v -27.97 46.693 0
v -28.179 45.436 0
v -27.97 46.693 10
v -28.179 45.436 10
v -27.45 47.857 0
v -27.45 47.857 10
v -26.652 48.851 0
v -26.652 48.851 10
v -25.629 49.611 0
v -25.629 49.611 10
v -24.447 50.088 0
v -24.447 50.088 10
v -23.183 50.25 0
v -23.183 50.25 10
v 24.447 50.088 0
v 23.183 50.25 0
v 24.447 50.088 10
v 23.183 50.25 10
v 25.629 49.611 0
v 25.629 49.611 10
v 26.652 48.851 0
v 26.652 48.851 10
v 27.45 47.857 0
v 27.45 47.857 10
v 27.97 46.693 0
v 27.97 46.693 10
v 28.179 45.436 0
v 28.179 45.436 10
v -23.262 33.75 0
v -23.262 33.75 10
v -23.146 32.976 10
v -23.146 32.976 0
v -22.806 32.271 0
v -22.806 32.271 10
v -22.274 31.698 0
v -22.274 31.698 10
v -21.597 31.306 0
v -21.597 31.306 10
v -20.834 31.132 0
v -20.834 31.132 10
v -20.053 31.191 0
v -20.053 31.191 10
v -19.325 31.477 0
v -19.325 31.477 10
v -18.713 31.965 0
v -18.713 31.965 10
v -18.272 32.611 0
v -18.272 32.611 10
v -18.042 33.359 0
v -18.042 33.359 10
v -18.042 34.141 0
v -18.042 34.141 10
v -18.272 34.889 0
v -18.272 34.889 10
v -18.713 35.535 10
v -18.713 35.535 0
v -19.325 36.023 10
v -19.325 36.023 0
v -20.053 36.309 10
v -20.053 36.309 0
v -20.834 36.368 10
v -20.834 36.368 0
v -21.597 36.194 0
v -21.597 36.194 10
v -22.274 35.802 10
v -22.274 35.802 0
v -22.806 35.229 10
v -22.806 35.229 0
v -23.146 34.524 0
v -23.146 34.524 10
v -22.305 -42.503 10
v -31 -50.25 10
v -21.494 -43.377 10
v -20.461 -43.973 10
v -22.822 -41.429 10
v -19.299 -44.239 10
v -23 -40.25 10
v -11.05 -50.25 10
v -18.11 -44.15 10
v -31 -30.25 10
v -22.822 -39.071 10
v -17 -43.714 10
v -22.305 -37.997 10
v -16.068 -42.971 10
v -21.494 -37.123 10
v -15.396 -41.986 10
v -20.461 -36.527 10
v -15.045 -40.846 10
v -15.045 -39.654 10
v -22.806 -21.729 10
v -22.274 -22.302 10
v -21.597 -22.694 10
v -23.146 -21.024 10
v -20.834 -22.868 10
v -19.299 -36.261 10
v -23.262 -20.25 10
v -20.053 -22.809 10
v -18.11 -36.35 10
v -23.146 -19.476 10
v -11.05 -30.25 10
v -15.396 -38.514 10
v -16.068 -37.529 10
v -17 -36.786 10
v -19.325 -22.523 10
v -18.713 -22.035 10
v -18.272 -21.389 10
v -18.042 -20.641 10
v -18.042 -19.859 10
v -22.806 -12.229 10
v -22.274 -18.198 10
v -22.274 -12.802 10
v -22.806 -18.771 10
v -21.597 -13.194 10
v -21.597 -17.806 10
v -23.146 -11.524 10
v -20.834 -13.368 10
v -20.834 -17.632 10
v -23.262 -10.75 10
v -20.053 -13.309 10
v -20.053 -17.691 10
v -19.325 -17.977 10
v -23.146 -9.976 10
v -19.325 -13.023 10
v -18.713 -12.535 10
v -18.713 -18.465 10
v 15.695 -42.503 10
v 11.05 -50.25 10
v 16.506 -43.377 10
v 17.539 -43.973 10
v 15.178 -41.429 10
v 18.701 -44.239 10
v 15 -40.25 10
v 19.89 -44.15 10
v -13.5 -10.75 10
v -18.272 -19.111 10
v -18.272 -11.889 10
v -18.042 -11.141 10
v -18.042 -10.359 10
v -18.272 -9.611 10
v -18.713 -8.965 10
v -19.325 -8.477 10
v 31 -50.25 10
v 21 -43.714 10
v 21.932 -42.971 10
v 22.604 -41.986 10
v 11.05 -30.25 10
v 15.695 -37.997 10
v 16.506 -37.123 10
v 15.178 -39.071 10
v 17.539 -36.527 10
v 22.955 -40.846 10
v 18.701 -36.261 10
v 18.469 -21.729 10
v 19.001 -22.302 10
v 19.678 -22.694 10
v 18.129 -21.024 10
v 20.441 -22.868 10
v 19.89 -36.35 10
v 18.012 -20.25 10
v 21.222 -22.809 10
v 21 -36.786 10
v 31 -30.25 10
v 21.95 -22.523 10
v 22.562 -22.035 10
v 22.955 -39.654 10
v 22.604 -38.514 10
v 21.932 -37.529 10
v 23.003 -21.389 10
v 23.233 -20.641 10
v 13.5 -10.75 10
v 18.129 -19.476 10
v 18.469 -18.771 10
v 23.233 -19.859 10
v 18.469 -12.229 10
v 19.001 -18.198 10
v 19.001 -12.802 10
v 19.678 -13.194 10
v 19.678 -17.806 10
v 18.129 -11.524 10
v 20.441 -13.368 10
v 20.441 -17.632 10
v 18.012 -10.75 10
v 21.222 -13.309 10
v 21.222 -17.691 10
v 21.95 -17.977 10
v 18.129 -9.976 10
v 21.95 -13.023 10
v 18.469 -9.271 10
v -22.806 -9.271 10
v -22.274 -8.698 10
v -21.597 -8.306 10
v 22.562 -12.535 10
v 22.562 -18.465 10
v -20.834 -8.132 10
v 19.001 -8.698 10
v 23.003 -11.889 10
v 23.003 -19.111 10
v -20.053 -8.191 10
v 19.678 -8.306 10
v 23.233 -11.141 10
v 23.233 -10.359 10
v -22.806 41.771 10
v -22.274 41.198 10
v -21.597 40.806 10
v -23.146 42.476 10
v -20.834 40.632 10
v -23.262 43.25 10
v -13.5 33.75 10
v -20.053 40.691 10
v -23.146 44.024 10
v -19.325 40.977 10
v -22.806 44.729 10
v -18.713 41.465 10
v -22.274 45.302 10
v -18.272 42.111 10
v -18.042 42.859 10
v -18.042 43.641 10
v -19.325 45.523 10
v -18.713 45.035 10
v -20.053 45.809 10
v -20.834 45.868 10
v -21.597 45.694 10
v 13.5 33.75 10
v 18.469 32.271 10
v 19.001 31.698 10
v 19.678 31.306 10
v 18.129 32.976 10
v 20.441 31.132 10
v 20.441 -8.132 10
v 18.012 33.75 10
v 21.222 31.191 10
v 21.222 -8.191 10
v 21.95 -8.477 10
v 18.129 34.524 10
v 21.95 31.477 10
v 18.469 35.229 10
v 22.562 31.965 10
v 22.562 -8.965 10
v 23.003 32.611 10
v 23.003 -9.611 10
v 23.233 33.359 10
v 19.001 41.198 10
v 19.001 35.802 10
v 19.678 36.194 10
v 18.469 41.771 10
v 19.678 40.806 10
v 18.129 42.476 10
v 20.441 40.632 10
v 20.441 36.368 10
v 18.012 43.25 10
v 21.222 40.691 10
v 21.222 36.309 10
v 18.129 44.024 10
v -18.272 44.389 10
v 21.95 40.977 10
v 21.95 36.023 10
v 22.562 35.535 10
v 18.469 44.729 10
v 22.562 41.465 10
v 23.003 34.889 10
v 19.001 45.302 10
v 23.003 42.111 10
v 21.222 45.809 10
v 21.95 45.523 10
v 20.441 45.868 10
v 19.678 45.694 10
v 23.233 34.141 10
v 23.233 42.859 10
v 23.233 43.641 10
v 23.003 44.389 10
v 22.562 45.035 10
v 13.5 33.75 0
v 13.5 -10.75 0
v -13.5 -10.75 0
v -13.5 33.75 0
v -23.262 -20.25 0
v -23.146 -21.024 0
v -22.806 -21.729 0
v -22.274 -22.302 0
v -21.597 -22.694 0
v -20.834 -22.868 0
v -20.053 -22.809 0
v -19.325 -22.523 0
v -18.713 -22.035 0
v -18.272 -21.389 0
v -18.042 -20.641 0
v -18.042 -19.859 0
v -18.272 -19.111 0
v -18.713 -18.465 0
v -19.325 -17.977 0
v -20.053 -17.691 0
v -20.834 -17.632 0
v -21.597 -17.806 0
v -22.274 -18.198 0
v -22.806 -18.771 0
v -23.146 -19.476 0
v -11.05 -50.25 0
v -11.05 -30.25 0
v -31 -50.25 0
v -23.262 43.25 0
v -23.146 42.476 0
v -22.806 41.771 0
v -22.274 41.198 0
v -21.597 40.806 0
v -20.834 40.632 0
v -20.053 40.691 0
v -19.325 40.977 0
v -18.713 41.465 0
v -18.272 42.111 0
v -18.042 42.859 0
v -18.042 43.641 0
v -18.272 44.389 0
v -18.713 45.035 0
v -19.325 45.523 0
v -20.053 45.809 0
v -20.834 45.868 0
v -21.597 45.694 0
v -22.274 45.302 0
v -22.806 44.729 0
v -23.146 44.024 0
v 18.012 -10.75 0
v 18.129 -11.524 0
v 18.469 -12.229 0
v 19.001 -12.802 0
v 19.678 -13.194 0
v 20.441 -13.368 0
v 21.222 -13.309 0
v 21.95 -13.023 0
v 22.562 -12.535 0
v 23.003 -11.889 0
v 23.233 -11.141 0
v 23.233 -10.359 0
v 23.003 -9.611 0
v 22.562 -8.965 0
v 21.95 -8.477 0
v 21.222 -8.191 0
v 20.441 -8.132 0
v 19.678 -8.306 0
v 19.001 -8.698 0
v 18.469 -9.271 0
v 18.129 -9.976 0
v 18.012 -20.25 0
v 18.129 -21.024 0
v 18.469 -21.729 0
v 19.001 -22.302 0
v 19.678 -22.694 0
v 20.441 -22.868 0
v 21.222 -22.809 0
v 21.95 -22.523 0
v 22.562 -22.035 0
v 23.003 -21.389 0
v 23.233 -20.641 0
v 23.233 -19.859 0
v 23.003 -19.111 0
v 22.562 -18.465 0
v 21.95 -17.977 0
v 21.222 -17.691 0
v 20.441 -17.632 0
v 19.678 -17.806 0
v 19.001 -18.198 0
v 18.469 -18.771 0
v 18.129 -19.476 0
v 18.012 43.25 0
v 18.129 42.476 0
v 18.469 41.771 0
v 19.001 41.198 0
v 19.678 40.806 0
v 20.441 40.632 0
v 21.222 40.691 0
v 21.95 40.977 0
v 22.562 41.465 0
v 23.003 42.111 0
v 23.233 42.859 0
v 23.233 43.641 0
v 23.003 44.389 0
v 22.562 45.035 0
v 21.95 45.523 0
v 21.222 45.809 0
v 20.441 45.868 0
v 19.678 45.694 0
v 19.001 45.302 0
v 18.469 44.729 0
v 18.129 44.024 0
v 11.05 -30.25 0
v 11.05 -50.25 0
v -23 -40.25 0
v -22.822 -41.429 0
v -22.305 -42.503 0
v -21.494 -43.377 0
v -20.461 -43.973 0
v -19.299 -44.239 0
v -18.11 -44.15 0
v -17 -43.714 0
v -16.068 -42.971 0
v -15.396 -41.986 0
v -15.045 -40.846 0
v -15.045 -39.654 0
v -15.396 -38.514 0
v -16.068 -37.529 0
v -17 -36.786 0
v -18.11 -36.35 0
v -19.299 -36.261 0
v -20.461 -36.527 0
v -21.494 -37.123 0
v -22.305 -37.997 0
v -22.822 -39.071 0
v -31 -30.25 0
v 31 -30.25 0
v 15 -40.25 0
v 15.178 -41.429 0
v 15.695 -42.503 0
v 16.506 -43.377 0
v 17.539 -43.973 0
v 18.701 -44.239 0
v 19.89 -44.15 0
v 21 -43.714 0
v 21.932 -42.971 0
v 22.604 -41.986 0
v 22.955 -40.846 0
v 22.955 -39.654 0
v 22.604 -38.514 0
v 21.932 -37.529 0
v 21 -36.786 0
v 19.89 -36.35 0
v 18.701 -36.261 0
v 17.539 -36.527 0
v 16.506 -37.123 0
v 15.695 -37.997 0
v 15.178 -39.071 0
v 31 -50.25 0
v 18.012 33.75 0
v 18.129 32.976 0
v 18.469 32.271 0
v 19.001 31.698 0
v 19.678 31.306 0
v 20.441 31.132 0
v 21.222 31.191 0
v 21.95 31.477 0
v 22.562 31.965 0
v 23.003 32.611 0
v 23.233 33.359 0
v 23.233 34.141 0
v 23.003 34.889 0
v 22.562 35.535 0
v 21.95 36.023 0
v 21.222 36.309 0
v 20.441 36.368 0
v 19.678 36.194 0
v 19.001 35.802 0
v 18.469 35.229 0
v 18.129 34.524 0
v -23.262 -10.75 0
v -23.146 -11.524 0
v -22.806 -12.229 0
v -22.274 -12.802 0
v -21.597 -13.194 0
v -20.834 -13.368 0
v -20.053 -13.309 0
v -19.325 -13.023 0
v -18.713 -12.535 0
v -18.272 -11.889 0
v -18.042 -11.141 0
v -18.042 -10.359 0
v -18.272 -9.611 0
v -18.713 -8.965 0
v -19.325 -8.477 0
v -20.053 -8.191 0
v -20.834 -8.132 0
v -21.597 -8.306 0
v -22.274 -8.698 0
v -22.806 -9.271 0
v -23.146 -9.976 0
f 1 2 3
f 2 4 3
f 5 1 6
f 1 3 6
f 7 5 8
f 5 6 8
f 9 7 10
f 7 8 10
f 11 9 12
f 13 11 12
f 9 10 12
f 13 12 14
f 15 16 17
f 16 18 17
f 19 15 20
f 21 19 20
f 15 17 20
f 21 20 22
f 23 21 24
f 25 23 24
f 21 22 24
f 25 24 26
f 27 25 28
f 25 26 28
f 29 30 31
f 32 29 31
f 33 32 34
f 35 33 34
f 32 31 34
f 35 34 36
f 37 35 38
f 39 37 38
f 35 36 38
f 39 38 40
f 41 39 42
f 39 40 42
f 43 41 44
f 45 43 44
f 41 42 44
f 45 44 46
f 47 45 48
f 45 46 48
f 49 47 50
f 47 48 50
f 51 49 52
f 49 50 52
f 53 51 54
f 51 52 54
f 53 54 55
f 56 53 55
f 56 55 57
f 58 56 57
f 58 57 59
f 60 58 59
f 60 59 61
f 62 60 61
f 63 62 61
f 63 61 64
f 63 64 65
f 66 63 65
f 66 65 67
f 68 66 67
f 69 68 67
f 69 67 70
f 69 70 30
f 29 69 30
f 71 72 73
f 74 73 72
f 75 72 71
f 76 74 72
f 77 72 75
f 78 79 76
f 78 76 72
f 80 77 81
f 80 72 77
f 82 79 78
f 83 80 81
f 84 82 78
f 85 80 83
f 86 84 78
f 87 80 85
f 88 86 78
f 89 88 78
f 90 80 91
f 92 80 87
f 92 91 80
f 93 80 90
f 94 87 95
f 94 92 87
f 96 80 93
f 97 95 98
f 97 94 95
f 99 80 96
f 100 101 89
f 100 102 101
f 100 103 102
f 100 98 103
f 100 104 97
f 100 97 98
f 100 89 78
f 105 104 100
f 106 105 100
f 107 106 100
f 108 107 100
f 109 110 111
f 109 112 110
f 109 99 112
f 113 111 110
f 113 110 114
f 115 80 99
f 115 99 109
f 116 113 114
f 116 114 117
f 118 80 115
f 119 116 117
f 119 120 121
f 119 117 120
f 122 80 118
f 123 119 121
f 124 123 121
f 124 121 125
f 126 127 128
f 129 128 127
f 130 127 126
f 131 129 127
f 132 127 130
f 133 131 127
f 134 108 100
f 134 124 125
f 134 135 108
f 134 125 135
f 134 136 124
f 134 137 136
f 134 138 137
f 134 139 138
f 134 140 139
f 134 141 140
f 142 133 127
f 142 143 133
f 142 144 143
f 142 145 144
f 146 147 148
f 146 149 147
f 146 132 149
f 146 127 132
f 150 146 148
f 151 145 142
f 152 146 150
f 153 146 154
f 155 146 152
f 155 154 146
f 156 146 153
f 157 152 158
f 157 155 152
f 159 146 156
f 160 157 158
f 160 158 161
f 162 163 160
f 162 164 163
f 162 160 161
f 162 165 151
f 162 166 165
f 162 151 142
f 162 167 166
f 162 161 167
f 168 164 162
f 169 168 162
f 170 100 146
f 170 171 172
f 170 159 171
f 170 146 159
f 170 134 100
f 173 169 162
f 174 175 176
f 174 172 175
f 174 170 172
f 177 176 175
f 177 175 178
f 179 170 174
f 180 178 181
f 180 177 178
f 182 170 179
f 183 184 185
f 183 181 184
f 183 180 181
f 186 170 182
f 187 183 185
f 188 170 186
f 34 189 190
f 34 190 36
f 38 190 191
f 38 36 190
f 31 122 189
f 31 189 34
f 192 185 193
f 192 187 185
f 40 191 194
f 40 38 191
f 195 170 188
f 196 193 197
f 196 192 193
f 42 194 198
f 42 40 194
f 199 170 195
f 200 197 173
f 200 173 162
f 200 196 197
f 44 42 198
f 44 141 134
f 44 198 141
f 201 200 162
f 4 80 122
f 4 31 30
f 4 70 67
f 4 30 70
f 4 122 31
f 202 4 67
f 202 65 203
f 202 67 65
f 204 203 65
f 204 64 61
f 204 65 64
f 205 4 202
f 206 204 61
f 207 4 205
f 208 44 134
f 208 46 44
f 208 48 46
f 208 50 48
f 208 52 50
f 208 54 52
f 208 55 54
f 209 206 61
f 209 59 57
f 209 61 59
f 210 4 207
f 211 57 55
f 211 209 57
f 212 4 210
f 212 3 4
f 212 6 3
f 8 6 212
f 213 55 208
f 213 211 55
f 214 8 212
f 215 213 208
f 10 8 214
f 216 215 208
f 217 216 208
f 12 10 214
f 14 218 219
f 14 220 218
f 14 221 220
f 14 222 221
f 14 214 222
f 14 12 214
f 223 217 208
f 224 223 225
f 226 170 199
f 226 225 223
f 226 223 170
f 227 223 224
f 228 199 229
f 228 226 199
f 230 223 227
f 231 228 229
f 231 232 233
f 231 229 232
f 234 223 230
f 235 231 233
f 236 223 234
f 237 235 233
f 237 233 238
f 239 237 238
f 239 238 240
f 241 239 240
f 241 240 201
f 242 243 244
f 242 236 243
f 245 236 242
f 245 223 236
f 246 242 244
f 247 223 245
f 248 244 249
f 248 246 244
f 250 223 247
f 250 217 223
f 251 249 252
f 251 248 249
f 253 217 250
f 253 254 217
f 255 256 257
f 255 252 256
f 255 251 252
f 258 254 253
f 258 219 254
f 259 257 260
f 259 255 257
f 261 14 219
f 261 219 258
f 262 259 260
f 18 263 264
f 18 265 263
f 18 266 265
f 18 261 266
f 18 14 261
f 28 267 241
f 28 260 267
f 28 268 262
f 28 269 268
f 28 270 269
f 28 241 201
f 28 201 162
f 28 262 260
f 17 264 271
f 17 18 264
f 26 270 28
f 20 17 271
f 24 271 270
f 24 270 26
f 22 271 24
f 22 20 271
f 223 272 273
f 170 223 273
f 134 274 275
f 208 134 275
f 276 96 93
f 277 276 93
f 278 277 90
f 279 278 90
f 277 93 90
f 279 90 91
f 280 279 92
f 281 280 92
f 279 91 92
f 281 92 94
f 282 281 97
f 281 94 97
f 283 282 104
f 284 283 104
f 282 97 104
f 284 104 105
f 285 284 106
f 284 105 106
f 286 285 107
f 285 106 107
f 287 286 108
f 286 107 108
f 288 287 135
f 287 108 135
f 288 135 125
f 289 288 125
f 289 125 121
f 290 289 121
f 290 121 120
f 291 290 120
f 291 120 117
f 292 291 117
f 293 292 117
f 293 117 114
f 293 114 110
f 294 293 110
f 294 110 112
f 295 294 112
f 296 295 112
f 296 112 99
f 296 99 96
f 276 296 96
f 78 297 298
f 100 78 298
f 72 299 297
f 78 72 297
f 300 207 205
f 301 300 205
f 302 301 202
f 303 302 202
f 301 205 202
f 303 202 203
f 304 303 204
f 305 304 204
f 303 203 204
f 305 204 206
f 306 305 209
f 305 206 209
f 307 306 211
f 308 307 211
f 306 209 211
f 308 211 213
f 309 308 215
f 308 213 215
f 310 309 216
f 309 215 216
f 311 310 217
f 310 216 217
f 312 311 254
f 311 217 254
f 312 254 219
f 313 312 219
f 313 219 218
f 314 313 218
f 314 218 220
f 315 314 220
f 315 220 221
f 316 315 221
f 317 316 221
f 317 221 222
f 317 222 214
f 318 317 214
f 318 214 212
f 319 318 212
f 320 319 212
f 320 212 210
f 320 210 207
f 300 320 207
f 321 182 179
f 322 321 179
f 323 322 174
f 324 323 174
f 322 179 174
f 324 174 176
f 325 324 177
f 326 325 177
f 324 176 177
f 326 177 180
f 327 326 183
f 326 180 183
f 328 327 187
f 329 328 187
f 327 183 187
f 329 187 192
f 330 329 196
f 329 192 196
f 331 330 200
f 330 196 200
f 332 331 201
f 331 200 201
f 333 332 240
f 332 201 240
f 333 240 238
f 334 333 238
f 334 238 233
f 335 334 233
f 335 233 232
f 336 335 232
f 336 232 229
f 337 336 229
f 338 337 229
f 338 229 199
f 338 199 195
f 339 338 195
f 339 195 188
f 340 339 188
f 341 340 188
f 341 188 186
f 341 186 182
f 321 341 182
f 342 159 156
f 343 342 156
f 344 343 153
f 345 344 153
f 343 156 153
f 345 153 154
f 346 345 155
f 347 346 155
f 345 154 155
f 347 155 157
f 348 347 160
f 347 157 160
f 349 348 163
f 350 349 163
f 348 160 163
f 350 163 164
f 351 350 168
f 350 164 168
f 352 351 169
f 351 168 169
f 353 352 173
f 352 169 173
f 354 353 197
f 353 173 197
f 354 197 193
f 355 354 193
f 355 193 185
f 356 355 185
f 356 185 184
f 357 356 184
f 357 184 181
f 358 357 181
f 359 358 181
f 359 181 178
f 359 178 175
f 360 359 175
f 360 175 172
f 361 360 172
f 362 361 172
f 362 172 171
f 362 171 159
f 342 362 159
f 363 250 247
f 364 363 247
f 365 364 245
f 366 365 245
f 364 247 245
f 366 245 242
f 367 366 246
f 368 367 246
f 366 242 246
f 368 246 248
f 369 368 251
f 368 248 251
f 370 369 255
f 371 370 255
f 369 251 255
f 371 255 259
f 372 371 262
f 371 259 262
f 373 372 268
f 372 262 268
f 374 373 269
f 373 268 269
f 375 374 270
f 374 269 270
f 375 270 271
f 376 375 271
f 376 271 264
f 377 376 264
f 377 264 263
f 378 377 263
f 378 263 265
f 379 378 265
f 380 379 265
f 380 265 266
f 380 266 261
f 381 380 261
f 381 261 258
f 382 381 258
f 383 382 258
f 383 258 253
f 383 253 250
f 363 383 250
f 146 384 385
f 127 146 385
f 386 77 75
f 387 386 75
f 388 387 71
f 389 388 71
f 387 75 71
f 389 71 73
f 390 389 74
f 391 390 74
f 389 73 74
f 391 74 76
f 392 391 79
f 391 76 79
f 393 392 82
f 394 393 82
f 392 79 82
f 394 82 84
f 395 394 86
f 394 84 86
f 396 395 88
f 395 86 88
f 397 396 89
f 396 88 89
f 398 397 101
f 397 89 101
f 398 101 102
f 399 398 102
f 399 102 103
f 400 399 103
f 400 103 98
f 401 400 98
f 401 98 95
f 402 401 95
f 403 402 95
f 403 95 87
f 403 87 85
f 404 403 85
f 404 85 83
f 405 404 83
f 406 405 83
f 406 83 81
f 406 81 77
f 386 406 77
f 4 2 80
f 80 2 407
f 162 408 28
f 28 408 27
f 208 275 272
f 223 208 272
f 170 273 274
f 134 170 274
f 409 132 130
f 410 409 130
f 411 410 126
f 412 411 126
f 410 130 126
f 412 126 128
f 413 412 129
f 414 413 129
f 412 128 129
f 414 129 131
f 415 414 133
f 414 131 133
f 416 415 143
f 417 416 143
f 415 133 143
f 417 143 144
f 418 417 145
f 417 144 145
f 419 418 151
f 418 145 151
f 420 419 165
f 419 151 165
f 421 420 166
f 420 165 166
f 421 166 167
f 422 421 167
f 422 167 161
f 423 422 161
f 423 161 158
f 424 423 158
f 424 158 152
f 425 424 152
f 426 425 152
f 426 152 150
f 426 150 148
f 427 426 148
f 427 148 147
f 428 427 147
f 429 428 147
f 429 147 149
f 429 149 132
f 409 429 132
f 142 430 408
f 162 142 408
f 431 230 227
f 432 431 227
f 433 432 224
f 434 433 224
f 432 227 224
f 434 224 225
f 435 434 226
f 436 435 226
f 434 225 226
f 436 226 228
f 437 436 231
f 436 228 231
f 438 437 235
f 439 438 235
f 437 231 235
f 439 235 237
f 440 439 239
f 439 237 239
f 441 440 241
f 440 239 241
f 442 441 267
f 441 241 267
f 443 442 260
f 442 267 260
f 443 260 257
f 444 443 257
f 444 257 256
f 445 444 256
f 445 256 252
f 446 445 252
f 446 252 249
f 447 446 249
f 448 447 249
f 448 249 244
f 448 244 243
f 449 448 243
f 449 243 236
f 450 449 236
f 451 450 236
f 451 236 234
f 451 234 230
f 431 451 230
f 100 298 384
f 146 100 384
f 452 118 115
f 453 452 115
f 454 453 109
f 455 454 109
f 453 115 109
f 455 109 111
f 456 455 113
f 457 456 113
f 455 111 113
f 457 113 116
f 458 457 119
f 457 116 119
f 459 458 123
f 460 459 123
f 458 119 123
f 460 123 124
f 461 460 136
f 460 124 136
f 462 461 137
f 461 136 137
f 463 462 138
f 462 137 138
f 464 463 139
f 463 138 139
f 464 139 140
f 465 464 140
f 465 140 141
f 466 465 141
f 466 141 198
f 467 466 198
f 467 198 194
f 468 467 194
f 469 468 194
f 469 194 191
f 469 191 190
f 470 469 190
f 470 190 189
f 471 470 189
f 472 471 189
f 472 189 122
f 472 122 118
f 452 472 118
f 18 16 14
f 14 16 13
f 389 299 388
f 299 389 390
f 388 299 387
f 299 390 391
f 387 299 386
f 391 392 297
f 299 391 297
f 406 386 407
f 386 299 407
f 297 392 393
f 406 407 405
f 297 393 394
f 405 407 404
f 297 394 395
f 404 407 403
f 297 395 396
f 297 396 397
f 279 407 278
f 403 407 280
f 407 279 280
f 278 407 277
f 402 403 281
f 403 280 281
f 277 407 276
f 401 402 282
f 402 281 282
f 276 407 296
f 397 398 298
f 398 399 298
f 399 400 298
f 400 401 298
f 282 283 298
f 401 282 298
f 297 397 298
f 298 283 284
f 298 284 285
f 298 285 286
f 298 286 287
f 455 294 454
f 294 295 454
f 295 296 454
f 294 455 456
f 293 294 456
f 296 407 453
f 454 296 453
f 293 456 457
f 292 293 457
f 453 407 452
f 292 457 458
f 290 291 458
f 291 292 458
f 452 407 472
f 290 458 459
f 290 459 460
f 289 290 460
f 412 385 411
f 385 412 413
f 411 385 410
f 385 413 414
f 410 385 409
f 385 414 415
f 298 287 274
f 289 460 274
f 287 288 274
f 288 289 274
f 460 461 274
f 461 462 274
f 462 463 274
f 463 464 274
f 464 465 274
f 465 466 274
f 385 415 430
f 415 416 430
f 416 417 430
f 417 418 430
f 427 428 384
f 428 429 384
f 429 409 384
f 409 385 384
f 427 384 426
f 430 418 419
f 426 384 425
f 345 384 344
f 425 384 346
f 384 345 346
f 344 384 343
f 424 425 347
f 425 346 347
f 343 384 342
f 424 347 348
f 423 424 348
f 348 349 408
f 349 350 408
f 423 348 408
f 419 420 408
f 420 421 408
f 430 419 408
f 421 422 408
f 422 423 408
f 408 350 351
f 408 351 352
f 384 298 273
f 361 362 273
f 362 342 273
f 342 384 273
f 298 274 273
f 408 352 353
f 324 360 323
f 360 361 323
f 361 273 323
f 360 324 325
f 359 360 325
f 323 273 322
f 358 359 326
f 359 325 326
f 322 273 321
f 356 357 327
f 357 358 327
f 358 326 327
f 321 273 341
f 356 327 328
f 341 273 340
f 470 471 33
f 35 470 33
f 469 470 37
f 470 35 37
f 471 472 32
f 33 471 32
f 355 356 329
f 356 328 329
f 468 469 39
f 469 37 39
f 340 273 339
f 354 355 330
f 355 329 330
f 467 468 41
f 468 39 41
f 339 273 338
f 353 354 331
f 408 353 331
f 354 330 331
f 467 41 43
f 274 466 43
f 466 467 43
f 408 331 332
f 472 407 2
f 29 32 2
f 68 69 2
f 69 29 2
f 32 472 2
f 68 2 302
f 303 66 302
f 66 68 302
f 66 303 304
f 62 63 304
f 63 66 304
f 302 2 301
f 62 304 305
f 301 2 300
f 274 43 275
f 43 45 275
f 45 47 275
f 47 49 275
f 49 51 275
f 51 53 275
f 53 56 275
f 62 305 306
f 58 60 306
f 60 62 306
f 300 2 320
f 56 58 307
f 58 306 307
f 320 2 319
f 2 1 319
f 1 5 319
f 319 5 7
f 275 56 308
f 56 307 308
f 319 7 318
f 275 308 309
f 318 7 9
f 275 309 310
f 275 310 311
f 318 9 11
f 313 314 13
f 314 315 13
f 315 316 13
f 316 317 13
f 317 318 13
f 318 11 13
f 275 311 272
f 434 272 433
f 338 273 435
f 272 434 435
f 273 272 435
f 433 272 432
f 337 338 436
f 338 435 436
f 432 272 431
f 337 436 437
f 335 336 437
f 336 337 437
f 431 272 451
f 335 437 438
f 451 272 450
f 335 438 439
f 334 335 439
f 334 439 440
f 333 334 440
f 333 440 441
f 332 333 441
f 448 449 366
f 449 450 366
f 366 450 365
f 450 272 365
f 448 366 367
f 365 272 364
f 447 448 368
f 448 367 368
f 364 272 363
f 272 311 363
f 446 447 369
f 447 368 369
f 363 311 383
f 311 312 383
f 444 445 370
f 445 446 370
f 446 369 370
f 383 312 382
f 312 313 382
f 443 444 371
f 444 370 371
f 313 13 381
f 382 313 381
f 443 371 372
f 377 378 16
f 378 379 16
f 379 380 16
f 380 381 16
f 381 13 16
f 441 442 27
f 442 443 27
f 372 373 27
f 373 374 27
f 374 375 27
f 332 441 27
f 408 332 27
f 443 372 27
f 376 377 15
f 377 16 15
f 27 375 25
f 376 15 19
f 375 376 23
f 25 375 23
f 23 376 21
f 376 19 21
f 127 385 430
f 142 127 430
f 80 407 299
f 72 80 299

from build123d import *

# Parameters (mm, degrees)
F1_DEPTH = 10
F2_D     = 5.25
F3_D     = 8
F4_R     = 5


with BuildPart() as f1:
    # F0 (on Top) → F1 (new body)
    with BuildSketch(Plane.XY):
        Polygon((0, 33.75), (0, 50.25), (-28, 50.25), (-28, -50.25), (-11.05, -50.25), (-11.05, -30.25), (0, -30.25), (0, -10.75), (-13.5, -10.75), (-13.5, 33.75), align=None)
        Polygon((11.05, -50.25), (28, -50.25), (28, 50.25), (0, 50.25), (0, 33.75), (13.5, 33.75), (13.5, -10.75), (0, -10.75), (0, -30.25), (11.05, -30.25), align=None)
        Polygon((-28, -50.25), (-28, 50.25), (-31, -30.25), (-31, -50.25), align=None)
        Polygon((28, 50.25), (28, -50.25), (31, -50.25), (31, -30.25), align=None)
    extrude(amount=F1_DEPTH)

    # F2 (through all)
    with Locations(Plane(origin=(0, 0, 0), x_dir=(1, 0, 0), z_dir=(0, 0, -1))):
        with Locations((20.6375, 20.25), (-20.6375, 20.25), (-20.6375, -33.75), (20.6375, -33.75), (-20.6375, -43.25), (20.6375, -43.25), (20.6375, 10.75), (-20.6375, 10.75)):
            Hole(F2_D / 2)

    # F3 (through all)
    with Locations(Plane(origin=(0, 0, 0), x_dir=(1, 0, 0), z_dir=(0, 0, -1))):
        with Locations((-19, 40.25), (19, 40.25)):
            Hole(F3_D / 2)

    # F4
    f4_edges = [f1.edges().sort_by_distance(p)[0] for p in [
        (28, 50.25, 5),
        (-28, 50.25, 5),
    ]]
    fillet(f4_edges, radius=F4_R)


solid = f1.part
